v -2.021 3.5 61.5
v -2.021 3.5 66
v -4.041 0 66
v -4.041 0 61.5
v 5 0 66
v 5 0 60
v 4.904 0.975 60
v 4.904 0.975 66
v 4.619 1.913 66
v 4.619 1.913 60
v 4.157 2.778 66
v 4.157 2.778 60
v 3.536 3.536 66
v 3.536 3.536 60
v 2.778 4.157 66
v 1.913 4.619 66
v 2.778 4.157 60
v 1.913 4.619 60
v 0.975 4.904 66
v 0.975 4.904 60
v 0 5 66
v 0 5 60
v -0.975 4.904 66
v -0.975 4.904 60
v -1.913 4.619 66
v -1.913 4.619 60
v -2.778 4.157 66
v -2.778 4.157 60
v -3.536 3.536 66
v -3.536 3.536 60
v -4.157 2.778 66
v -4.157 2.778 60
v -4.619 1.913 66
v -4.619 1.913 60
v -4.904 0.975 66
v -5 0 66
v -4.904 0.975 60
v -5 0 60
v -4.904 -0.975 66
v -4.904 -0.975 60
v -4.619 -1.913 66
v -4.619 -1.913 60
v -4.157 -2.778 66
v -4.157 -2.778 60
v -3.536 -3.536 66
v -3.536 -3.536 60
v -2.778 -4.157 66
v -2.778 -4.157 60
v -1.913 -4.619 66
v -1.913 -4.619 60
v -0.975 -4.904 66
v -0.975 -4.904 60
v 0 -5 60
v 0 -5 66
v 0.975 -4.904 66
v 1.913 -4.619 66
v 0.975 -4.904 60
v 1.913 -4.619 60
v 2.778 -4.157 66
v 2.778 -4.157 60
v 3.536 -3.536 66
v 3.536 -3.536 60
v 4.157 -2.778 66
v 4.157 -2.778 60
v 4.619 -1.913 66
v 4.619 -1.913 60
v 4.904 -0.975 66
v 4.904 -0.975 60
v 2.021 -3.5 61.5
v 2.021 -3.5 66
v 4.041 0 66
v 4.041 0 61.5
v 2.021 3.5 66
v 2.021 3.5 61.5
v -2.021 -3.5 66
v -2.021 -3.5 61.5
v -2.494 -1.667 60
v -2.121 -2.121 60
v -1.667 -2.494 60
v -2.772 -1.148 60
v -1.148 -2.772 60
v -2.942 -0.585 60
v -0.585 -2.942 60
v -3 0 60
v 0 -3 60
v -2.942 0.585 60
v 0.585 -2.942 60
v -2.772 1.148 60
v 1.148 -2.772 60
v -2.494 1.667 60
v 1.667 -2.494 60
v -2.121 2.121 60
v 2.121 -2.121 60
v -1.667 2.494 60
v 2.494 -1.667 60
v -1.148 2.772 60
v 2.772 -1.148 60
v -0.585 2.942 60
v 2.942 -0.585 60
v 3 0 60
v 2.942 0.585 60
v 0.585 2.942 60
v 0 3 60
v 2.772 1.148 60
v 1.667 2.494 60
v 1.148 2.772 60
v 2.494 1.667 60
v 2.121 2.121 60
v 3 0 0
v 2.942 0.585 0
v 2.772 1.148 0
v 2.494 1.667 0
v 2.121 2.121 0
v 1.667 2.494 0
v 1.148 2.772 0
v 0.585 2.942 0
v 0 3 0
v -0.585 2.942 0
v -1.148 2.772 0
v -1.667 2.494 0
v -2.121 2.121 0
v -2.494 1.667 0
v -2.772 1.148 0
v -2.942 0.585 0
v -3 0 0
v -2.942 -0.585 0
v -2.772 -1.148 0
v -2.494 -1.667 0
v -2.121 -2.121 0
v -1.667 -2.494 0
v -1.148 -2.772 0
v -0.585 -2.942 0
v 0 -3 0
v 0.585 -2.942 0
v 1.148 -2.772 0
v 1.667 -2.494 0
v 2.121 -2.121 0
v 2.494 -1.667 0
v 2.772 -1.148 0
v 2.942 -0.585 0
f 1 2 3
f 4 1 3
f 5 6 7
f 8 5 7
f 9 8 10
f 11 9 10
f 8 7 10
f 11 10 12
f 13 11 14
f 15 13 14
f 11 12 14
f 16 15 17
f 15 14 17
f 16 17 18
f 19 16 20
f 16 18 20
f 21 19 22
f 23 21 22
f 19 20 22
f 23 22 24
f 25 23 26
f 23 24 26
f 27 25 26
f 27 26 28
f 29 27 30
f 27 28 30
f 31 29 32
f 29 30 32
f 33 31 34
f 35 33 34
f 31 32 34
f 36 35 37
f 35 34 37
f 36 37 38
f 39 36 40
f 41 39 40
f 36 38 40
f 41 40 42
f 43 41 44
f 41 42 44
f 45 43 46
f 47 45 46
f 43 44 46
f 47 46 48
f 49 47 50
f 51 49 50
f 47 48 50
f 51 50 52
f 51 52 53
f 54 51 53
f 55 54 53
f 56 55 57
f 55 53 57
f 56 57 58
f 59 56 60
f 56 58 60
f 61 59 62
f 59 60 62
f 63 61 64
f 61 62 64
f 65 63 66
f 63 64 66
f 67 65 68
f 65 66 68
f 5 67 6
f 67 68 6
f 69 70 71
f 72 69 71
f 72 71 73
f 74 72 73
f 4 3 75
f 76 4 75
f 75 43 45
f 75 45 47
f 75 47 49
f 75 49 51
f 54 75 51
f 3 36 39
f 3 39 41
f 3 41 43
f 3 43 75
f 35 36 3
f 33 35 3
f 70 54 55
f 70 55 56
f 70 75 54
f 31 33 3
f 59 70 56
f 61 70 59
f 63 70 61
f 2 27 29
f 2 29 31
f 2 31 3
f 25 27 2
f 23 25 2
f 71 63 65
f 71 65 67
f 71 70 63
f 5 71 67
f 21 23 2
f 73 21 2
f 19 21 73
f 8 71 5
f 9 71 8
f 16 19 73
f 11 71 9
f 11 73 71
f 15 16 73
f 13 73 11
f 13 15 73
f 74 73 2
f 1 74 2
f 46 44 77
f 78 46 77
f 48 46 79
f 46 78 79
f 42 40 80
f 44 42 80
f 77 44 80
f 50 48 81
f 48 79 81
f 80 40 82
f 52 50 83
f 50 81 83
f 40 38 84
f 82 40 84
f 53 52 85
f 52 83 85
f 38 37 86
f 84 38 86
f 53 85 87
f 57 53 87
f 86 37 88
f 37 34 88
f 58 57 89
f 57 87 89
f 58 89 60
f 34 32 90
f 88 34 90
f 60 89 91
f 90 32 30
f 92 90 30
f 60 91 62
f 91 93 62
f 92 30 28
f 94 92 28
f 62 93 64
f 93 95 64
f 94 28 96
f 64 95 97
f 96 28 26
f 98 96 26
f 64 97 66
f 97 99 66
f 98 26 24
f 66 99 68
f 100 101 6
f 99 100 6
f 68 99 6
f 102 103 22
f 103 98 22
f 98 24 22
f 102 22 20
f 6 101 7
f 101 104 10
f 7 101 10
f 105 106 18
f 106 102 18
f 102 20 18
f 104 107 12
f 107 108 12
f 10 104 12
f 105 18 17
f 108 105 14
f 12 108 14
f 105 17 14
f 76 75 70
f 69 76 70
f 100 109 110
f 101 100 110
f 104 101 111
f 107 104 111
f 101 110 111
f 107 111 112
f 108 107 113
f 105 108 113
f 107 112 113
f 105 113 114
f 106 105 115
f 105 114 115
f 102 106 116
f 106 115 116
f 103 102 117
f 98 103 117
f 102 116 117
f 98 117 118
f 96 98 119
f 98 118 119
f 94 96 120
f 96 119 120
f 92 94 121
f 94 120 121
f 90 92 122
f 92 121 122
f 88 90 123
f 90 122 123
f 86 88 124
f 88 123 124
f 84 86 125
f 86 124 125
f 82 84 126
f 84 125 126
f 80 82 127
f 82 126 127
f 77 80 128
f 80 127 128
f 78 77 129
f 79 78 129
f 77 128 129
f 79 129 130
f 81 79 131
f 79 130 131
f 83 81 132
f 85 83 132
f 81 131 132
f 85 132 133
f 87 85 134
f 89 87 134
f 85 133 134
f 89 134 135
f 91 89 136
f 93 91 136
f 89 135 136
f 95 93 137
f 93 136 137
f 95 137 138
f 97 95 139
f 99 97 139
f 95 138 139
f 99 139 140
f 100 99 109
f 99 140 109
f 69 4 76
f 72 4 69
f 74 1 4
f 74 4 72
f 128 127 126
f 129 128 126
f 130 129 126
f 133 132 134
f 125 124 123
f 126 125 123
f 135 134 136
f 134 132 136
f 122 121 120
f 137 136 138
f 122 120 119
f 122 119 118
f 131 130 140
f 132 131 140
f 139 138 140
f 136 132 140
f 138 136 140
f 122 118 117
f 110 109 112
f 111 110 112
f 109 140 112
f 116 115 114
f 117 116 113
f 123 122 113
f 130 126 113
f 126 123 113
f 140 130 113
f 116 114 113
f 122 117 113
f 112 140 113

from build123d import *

# Parameters (mm, degrees)
ESQUISSE1_R             = 3
BOSS_EXTRU_1_DEPTH      = 60
ESQUISSE2_R             = 5
BOSS_EXTRU_2_DEPTH      = 6
ENL_V_MAT_EXTRU_1_DEPTH = 4.5


with BuildPart() as part:
    # Esquisse1 → Boss.-Extru.1 (new body)
    with BuildSketch(Plane.XY):
        Circle(ESQUISSE1_R)
    extrude(amount=BOSS_EXTRU_1_DEPTH)

    # Esquisse2 → Boss.-Extru.2 (add)
    with BuildSketch(Plane.XY.offset(60)):
        Circle(ESQUISSE2_R)
    extrude(amount=BOSS_EXTRU_2_DEPTH)

    # Esquisse3 → Enlèv. mat.-Extru.1 (cut)
    with BuildSketch(Plane.XY.offset(66)):
        Polygon((4.041451884, 0), (2.020725942, 3.5), (-2.020725942, 3.5), (-4.041451884, 0), (-2.020725942, -3.5), (2.020725942, -3.5), align=None)
    extrude(amount=-ENL_V_MAT_EXTRU_1_DEPTH, mode=Mode.SUBTRACT)


solid = part.part
